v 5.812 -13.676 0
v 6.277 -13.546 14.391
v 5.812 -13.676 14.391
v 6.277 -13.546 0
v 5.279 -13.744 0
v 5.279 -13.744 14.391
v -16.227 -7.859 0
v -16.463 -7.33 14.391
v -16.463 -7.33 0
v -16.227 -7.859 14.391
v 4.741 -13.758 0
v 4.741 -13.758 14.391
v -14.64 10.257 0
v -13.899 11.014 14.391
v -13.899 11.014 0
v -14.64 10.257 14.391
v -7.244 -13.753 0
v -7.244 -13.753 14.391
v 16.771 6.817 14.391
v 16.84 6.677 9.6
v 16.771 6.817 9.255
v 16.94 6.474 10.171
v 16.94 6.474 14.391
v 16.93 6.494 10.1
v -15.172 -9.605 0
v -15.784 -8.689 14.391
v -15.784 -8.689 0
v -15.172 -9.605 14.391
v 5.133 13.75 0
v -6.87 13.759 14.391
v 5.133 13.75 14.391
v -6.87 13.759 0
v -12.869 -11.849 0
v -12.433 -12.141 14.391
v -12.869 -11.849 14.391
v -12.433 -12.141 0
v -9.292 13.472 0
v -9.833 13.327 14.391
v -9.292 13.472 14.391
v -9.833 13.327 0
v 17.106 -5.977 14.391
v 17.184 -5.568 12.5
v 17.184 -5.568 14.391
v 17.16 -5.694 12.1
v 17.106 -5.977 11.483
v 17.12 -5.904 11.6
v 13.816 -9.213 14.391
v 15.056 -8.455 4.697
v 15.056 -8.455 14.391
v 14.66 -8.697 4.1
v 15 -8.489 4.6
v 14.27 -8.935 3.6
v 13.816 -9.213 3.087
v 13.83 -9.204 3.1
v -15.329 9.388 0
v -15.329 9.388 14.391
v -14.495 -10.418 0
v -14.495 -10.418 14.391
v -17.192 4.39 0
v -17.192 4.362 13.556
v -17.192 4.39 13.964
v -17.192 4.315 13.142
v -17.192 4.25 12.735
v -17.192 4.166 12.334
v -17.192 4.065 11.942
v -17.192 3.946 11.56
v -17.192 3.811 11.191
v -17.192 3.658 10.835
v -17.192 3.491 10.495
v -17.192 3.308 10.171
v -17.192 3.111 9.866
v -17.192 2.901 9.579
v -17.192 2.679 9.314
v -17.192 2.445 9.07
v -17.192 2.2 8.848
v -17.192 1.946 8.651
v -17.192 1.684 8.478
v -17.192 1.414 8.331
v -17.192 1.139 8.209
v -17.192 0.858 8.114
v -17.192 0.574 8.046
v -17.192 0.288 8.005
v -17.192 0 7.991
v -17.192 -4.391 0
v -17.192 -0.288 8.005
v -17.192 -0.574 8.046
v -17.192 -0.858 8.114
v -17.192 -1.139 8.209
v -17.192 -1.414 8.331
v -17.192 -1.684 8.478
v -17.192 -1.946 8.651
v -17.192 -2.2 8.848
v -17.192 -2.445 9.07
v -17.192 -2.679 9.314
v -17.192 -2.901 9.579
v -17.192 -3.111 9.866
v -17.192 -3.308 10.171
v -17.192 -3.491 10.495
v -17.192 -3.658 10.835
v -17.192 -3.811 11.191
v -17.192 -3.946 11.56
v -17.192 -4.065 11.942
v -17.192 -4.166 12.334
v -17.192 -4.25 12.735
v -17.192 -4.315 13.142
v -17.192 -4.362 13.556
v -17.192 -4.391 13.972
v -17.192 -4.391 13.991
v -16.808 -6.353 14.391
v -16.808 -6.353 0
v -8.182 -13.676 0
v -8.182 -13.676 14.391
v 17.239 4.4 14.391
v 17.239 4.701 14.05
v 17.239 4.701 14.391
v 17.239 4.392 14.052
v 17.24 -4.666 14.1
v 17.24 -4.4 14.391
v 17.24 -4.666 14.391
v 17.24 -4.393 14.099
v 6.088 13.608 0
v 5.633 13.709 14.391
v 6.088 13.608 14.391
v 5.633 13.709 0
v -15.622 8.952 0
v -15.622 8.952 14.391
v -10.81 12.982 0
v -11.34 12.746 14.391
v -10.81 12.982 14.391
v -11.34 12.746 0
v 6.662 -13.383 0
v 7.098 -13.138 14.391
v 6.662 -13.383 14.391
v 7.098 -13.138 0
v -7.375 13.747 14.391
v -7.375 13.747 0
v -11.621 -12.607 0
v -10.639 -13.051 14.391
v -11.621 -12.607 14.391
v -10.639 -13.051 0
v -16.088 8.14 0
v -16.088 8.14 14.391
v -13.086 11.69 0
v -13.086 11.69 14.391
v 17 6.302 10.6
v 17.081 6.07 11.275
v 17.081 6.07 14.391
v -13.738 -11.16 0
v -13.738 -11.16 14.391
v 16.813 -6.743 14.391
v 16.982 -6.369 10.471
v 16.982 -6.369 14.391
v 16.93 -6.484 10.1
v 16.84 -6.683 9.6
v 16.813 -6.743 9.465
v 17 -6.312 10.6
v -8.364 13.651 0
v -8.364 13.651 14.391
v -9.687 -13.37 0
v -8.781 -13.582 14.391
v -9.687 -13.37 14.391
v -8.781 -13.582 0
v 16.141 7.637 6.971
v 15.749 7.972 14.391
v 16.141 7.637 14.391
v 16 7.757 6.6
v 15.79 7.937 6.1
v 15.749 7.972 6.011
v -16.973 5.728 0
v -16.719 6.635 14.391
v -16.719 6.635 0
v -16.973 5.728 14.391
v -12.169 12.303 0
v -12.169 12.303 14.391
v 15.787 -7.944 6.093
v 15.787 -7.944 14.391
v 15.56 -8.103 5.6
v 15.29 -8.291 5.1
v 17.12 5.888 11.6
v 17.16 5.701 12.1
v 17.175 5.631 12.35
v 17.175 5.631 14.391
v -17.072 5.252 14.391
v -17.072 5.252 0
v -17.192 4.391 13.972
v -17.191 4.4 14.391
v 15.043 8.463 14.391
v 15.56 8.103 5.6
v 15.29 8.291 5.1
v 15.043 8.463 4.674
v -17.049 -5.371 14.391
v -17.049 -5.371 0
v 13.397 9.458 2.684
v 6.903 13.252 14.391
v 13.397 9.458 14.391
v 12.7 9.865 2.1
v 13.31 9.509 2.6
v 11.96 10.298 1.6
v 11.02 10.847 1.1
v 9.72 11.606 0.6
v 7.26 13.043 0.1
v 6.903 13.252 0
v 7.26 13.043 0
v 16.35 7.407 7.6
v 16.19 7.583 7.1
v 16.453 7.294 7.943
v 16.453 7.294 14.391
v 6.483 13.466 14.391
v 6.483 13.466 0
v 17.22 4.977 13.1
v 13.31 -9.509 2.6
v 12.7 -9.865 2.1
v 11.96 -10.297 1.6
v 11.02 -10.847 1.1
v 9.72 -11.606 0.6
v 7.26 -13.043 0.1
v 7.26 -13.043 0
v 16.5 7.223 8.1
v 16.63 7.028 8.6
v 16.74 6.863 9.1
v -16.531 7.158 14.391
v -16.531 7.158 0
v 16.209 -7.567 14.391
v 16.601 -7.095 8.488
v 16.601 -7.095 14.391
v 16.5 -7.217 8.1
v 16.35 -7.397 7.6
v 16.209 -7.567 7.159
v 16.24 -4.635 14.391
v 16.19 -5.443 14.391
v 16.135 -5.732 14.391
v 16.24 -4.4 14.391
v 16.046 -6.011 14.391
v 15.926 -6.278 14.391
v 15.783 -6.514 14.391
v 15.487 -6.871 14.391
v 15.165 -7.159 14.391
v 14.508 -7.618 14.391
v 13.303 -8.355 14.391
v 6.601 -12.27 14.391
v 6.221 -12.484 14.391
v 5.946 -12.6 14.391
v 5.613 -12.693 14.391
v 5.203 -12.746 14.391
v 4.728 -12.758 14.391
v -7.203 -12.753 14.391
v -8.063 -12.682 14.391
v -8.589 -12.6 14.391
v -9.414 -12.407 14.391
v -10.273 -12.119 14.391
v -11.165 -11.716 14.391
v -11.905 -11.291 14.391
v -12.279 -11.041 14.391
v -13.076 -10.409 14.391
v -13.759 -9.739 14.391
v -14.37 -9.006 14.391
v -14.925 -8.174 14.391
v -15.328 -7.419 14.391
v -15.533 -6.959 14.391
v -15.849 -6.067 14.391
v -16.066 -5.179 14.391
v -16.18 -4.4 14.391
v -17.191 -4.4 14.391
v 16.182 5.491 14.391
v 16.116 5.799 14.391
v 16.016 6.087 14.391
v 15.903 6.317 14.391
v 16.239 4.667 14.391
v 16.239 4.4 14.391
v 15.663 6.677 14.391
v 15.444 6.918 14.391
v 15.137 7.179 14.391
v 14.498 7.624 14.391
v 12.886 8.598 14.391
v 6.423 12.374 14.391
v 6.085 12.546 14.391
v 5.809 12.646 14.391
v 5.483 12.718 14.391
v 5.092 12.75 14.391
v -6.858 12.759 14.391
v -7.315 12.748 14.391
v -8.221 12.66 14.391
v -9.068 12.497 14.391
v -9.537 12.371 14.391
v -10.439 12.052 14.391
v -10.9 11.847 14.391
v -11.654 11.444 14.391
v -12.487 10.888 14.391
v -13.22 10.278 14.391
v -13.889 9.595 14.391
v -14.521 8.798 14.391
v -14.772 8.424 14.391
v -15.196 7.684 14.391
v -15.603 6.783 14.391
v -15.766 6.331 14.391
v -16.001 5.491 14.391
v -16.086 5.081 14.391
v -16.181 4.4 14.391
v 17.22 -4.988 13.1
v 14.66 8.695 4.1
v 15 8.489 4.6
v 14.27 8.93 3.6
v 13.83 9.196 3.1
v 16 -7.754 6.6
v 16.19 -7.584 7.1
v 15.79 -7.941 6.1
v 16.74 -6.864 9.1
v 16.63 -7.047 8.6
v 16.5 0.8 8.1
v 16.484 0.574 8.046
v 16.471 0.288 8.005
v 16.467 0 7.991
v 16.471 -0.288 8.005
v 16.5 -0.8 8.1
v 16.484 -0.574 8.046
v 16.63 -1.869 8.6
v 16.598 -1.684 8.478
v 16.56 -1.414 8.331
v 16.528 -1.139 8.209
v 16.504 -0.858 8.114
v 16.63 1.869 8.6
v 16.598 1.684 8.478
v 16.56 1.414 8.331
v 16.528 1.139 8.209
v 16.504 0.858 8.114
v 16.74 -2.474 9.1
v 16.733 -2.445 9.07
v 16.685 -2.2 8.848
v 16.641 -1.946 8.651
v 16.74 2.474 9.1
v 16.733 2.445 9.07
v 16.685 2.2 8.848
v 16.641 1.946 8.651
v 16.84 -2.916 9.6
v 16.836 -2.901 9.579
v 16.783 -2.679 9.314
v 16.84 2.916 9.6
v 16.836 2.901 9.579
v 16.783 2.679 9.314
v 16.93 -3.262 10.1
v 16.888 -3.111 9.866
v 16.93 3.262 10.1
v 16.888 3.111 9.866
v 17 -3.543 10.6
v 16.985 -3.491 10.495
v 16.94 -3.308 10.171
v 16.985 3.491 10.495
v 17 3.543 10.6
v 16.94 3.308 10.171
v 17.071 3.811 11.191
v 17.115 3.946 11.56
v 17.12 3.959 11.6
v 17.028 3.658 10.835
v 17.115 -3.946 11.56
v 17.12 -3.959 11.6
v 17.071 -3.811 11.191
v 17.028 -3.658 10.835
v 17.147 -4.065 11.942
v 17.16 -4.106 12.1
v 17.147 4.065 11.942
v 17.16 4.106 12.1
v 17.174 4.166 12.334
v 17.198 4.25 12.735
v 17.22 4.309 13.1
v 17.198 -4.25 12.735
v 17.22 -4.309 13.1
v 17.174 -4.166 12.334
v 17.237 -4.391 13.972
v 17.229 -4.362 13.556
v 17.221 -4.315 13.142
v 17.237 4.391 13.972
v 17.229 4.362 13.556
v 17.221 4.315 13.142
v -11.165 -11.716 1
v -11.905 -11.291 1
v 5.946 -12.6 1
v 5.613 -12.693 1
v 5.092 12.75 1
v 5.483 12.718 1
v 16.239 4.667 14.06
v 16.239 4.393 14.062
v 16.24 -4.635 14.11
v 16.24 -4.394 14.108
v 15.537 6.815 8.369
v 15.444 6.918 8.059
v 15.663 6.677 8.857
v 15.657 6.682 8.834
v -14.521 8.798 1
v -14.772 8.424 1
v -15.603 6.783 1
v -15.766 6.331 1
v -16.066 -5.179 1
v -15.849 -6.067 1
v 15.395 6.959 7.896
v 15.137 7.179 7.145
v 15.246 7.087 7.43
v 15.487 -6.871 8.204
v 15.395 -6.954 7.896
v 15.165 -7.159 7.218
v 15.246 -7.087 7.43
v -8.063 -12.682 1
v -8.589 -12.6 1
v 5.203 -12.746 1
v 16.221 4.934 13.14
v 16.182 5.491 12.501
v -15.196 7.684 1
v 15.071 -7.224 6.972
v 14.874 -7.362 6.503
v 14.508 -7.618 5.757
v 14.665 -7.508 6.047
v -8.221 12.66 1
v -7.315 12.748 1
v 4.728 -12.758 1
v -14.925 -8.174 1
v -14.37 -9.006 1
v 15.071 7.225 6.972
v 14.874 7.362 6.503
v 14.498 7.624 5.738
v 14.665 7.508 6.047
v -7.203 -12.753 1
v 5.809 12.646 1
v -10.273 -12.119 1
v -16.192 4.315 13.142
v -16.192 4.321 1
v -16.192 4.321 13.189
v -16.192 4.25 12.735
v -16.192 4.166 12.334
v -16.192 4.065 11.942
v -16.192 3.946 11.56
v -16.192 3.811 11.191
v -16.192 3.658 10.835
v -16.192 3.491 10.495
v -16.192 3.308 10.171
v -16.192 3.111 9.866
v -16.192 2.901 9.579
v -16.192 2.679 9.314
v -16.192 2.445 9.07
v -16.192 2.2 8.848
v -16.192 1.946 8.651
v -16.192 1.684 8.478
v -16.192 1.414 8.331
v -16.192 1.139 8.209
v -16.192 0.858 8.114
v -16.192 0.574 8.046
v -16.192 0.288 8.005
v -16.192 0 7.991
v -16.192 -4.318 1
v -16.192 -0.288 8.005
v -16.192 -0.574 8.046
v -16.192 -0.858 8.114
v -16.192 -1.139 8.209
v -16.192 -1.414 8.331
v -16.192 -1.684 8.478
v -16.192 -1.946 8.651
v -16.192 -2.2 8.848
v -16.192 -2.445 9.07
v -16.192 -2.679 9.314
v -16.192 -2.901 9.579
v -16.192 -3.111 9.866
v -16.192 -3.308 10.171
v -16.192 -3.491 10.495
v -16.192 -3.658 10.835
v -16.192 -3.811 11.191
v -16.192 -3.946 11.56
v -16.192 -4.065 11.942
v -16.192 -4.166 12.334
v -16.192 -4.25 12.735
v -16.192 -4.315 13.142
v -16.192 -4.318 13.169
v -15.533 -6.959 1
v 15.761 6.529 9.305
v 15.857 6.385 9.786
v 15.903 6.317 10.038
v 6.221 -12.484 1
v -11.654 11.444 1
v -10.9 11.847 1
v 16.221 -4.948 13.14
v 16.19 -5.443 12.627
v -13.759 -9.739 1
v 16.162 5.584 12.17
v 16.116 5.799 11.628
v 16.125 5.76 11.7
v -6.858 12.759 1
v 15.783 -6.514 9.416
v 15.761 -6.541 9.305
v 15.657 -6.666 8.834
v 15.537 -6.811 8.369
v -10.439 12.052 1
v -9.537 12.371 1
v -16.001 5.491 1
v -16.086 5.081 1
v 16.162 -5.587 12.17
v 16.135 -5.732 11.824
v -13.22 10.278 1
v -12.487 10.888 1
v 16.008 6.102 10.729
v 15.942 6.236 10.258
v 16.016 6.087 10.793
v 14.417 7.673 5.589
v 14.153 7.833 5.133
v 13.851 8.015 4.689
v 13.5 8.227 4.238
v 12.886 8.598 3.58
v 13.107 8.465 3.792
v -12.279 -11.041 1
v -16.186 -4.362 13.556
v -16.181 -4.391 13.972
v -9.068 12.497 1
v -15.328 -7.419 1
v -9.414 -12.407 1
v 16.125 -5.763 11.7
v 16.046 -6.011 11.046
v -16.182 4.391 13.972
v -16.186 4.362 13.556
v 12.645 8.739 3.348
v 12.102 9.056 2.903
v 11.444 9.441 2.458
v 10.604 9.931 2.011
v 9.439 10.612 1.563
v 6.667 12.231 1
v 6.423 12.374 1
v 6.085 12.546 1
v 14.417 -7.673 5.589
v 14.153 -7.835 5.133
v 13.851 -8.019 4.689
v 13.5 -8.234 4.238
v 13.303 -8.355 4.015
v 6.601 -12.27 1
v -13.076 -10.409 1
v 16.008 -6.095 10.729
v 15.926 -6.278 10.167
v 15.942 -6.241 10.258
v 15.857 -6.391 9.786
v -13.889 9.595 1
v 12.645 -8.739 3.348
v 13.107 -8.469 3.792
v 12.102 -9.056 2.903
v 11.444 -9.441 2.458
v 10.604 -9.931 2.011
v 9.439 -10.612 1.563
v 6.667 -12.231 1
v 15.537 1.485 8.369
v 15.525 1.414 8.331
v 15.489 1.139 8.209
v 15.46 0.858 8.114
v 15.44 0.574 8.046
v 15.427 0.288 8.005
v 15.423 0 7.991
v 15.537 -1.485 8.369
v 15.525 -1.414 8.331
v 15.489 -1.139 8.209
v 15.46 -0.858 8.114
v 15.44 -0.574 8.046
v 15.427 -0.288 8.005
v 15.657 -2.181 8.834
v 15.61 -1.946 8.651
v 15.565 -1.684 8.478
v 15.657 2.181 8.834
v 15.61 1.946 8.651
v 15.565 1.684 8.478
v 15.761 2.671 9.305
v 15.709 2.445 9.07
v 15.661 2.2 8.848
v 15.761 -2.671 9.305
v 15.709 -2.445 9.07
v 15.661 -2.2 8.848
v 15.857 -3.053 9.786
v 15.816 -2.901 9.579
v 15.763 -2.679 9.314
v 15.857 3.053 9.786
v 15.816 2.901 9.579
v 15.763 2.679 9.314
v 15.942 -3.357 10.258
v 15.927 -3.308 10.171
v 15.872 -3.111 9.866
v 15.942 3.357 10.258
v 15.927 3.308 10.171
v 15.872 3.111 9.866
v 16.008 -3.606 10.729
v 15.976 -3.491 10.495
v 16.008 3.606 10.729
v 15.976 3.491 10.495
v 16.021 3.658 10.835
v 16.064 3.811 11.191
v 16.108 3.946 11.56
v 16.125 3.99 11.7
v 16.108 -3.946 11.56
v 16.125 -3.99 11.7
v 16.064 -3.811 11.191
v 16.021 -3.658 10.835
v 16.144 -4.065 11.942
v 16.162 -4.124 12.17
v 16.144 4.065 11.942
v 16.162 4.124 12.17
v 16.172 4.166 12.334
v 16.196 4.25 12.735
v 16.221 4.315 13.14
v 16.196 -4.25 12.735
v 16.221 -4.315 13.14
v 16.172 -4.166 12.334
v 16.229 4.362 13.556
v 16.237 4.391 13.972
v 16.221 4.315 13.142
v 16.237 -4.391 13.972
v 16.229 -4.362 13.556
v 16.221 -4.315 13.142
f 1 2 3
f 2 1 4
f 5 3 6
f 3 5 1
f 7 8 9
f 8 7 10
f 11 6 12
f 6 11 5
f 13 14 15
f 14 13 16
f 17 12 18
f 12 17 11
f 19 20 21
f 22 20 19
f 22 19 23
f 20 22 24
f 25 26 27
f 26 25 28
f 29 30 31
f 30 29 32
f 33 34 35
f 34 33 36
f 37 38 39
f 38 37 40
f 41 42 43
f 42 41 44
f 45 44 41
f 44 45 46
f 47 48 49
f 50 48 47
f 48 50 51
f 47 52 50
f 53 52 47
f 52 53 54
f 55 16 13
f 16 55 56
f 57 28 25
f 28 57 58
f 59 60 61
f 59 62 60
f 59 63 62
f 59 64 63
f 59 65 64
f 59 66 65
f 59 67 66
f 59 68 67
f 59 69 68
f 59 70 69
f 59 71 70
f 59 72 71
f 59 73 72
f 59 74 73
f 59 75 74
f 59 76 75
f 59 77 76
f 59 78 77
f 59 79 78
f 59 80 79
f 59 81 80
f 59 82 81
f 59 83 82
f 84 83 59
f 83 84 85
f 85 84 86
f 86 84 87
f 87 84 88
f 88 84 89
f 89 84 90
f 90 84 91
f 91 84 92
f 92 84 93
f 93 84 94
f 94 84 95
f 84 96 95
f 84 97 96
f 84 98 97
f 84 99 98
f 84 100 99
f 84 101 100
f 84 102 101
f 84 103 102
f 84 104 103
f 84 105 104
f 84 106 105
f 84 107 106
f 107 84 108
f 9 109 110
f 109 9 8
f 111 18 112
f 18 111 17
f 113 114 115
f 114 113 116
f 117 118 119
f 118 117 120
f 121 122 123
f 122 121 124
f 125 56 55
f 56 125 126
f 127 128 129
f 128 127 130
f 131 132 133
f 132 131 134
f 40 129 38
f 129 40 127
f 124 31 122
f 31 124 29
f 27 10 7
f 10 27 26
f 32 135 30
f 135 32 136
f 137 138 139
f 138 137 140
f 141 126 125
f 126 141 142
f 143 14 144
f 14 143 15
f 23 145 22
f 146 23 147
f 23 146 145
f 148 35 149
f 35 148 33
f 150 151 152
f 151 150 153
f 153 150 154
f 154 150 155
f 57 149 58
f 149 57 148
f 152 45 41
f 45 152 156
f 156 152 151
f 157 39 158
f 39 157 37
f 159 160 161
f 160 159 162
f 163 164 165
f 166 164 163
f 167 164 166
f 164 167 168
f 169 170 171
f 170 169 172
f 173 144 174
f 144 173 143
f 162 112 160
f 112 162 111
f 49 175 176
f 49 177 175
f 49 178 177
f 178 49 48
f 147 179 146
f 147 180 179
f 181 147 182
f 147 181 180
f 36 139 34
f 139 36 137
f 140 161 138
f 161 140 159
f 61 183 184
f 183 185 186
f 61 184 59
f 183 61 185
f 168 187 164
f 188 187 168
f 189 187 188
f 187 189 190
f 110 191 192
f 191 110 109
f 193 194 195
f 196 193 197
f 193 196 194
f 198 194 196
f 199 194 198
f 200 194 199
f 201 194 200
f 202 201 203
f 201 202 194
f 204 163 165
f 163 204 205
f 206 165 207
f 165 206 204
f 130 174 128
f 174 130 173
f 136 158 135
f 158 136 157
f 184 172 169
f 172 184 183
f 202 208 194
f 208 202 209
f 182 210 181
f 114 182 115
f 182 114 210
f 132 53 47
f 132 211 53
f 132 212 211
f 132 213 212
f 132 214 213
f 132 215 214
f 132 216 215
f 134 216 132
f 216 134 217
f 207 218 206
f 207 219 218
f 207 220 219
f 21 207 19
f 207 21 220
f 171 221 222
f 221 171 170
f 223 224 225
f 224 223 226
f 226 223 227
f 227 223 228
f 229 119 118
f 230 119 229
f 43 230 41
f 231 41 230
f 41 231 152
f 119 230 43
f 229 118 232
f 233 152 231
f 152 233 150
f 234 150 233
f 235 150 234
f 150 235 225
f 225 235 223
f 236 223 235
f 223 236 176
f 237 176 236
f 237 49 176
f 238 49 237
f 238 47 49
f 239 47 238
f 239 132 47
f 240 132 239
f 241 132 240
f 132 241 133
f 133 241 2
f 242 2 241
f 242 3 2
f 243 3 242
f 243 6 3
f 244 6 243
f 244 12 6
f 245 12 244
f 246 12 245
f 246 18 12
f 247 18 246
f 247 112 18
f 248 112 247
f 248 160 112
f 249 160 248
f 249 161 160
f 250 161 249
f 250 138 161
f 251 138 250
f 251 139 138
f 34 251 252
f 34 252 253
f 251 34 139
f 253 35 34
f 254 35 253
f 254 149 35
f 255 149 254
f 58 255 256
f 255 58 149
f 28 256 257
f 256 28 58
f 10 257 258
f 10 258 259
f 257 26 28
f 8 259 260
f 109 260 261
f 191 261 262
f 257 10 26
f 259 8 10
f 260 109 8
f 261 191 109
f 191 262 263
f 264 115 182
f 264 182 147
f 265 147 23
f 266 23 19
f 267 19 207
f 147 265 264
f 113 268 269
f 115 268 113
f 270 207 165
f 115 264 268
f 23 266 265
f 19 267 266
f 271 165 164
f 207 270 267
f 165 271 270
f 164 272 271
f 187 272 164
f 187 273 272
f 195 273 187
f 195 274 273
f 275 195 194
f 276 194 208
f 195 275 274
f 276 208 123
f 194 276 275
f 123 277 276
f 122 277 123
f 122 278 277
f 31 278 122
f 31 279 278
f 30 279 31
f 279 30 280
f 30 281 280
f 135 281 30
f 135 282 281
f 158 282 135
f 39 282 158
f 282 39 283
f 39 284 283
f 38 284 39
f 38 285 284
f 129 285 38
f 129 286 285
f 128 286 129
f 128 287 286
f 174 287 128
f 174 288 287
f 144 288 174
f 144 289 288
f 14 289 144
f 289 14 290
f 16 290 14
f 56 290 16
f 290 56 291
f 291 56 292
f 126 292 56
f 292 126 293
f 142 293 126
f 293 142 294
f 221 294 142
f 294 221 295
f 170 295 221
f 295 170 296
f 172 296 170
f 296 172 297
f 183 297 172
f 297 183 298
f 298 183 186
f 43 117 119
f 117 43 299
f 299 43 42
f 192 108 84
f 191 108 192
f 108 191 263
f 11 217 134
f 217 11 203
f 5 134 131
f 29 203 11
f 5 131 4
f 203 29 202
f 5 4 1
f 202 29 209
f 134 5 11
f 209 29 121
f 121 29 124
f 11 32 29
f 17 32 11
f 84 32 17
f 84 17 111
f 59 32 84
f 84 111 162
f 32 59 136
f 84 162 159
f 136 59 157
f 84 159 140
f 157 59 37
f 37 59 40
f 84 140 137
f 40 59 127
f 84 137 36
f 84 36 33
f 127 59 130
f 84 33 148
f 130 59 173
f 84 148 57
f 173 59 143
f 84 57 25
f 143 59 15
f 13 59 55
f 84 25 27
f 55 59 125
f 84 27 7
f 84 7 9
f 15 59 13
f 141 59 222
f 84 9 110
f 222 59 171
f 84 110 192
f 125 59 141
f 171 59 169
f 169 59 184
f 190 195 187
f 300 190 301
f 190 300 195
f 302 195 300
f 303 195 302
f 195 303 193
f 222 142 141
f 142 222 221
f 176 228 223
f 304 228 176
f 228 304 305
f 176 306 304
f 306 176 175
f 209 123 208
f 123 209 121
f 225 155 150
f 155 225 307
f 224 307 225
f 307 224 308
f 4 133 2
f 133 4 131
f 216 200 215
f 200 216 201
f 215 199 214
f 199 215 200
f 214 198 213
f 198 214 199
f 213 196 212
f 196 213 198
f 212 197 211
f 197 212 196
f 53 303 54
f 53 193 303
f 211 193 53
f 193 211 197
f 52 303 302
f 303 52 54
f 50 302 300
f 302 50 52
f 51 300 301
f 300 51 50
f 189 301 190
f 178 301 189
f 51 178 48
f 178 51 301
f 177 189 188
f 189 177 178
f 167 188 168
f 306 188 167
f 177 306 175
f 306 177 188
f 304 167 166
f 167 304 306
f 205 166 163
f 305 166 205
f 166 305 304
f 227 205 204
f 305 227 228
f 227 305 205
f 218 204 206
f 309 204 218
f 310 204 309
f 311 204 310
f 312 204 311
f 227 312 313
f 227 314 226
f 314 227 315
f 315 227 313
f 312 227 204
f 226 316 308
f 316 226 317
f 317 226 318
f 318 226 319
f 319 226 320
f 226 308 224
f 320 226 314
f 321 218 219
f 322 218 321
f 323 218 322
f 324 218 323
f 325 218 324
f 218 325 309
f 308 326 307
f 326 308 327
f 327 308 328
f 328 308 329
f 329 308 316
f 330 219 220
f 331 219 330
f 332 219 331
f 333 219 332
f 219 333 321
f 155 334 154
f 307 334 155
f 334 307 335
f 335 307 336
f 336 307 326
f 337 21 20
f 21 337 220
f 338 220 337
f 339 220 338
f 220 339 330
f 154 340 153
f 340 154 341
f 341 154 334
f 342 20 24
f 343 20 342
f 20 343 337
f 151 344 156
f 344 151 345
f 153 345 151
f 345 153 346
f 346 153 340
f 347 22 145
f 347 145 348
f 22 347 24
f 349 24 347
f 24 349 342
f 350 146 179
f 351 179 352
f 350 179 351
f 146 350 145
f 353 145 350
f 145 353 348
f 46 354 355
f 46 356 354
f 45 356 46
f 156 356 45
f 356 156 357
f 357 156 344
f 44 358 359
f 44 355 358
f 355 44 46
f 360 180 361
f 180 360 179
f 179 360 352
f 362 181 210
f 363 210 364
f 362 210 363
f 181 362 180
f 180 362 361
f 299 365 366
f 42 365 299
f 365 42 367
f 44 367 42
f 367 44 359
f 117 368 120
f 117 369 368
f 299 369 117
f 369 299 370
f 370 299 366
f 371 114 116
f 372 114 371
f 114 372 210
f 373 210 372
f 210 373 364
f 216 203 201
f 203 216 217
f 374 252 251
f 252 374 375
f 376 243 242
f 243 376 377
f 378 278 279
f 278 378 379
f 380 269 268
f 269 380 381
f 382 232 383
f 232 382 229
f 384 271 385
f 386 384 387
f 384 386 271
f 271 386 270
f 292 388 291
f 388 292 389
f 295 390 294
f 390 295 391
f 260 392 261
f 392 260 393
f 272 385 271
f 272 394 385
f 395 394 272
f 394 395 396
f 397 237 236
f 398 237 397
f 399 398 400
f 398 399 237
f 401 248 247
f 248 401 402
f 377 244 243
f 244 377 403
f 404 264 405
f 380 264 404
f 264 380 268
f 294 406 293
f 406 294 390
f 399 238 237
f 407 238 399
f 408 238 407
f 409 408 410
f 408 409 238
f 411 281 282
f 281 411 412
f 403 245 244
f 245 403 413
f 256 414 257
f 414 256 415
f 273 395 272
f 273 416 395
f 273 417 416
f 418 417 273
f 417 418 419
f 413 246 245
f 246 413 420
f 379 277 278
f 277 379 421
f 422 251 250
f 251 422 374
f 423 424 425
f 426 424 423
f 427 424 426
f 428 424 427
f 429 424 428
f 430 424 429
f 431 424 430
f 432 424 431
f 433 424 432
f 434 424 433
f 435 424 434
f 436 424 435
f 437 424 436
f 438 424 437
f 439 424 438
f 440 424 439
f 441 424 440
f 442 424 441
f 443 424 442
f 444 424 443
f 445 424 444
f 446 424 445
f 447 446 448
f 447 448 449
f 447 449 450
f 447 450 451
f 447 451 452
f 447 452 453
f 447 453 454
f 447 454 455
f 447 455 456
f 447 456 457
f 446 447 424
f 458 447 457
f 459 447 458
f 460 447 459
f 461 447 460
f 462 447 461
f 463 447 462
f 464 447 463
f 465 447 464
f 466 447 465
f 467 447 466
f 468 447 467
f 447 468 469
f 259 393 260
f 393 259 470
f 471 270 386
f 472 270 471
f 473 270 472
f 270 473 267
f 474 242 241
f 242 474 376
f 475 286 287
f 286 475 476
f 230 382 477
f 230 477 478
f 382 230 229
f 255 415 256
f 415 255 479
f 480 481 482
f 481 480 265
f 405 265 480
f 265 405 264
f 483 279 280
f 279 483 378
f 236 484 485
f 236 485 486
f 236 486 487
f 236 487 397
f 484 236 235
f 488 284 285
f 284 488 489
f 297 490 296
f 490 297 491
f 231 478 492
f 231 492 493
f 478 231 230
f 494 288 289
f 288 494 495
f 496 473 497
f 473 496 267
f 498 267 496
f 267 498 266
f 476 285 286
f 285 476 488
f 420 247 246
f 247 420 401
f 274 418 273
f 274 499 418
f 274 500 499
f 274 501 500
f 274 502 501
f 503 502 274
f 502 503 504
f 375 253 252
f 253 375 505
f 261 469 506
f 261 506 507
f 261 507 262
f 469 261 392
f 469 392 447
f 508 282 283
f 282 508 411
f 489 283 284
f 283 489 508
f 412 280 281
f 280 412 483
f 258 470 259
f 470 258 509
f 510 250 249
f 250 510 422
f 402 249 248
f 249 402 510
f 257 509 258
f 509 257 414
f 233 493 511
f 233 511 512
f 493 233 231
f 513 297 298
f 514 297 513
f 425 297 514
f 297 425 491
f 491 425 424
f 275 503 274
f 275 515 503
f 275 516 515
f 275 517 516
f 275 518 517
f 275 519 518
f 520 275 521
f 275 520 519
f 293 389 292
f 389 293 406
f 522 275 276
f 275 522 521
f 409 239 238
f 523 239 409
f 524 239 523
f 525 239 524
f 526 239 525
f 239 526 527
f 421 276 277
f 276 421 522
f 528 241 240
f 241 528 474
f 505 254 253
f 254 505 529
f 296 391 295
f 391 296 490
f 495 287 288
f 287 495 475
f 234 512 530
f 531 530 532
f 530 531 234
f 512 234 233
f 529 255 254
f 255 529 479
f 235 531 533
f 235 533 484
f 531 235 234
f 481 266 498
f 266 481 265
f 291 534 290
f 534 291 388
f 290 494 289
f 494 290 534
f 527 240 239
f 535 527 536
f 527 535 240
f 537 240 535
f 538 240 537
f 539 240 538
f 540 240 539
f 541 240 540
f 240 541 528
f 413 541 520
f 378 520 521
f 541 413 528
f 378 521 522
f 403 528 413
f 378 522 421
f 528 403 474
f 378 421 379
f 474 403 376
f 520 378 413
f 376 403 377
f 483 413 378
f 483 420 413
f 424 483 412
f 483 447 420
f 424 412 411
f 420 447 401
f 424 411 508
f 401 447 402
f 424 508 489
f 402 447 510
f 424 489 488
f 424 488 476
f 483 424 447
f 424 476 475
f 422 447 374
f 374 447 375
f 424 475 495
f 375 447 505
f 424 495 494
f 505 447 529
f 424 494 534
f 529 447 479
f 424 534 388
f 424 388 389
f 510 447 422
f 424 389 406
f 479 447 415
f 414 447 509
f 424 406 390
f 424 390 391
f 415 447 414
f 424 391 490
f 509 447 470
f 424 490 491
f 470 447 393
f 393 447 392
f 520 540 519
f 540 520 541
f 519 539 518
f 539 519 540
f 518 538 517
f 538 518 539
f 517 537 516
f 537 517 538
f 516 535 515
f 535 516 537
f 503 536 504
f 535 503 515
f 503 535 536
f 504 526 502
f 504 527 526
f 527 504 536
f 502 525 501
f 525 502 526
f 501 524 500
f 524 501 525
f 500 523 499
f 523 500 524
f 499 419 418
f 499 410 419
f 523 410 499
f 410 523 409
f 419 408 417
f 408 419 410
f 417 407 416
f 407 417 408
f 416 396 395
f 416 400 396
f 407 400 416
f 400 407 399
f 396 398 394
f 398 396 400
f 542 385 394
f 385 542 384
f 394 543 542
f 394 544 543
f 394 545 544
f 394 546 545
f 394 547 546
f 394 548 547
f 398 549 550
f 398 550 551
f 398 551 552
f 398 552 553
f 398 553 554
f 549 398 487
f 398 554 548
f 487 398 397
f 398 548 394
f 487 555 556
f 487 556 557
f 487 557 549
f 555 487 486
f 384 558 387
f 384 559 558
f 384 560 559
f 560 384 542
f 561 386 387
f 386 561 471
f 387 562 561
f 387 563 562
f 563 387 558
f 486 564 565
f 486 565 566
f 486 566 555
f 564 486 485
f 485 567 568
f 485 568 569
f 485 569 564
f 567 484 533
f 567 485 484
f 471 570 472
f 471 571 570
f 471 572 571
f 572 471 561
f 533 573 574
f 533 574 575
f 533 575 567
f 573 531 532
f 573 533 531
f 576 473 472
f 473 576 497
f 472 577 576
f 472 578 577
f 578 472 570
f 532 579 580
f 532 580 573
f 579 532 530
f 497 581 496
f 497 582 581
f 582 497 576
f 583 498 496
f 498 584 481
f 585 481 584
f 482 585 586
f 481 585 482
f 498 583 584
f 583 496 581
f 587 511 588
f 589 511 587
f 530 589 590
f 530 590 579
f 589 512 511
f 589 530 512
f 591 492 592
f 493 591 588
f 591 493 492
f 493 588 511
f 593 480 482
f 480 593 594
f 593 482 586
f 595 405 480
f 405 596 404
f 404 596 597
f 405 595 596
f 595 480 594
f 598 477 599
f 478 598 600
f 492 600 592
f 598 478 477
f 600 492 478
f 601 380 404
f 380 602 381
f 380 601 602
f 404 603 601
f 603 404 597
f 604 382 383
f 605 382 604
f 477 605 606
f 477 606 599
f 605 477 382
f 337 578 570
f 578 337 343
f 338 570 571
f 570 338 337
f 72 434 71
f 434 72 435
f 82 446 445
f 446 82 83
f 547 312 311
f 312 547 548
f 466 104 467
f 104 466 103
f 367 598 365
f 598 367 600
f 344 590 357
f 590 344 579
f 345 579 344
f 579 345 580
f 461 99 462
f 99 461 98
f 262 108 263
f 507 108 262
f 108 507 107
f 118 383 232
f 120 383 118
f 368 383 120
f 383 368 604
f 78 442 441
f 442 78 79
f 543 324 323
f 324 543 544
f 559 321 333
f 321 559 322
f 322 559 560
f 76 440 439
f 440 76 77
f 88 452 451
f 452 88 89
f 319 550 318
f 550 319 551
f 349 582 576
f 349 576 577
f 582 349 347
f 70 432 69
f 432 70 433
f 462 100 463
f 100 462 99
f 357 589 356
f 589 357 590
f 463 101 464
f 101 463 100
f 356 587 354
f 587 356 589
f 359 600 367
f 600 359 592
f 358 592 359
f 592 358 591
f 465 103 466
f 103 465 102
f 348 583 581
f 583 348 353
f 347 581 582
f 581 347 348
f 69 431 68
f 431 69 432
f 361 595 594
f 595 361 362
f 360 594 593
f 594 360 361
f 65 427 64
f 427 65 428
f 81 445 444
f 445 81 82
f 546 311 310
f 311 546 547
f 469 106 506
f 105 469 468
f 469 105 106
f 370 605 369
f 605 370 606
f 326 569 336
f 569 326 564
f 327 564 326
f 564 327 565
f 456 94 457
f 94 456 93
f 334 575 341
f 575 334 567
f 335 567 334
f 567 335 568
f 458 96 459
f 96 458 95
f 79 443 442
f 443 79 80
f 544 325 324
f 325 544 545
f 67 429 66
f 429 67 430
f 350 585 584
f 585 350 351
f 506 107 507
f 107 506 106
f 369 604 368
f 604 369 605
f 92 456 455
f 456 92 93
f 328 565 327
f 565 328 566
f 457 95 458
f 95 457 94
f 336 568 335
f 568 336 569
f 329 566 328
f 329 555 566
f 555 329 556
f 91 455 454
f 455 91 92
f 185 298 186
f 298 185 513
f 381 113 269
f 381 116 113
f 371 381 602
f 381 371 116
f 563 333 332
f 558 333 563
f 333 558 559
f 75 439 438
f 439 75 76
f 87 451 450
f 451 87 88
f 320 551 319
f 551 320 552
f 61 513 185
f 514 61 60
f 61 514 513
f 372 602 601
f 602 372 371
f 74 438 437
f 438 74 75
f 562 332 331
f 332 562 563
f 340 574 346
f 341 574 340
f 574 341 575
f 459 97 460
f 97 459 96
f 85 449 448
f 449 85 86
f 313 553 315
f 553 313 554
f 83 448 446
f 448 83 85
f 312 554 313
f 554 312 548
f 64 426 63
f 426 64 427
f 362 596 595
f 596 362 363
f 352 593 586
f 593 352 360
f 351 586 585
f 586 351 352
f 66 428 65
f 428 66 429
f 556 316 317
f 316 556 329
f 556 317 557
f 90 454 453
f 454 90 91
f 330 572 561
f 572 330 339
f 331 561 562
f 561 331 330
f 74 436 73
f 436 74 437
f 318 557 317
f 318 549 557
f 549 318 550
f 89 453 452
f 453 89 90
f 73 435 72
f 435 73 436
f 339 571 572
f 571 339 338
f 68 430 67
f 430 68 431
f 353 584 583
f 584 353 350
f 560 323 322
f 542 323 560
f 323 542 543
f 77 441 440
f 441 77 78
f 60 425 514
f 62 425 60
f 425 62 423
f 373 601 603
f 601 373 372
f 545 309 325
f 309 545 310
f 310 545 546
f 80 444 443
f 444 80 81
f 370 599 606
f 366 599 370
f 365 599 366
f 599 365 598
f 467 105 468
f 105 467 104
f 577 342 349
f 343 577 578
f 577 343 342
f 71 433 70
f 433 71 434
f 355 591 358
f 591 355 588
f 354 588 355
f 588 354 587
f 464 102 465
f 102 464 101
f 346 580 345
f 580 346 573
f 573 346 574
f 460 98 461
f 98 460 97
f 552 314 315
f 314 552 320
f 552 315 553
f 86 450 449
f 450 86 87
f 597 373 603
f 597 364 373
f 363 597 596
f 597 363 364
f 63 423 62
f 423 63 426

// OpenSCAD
// 11 - Honeycomb - topminibox - box: static OpenSCAD reconstruction (shallow box with a scooped end and a notch).
//
// Adapted from "Onz" by sez16sez (Thingiverse): https://www.thingiverse.com/thing:2739061
// Licensed CC BY-NC 4.0 (https://creativecommons.org/licenses/by-nc/4.0/). This file is a derivative reconstruction of
// the design's STL (11_-_Honeycomb_-_topminibox_-_box.stl) made for CanFactory: same attribution, same non-commercial
// terms, no additional rights to the original. See ../ATTRIBUTION.md.
//
// Geometry: a 1 mm shell over a D-shaped plan (rounded -X end, chamfered +X end) with a 1 mm floor. The +X end is swept
// away by a curved profile (the outer surface climbs from x = 6 at the floor to x = 17.2 at the rim) and an elliptical
// notch is cut through the rim at both ends. Units are millimetres; the part is centred on the Z axis with its floor on z = 0.
// The source STL sat at (239.3, -84.8) on the print plate. Static reconstruction: named dimensions only; no snap
// parameter (its notches already are the detent the lid latches into).

SCALE     = 1;
ROUNDNESS = 96;

HEIGHT = 14.391;      // rim height
WALL   = 1;           // wall and floor thickness

// Plan outline (x, y) about the part centre.
PLAN = [[16.982, -6.369], [17.106, -5.977], [17.184, -5.568], [17.24, -4.666], [17.239, 4.701], [17.175, 5.631], [17.081,
        6.07], [16.94, 6.474], [16.771, 6.817], [16.453, 7.294], [16.141, 7.637], [15.749, 7.972], [15.043, 8.463],
        [13.397, 9.458], [6.903, 13.252], [6.483, 13.466], [6.088, 13.608], [5.633, 13.709], [5.133, 13.75], [-6.87,
        13.759], [-7.375, 13.747], [-8.364, 13.651], [-9.292, 13.472], [-9.833, 13.327], [-10.81, 12.982], [-11.34,
        12.746], [-12.169, 12.303], [-13.086, 11.69], [-13.899, 11.014], [-14.64, 10.257], [-15.329, 9.388], [-15.622,
        8.952], [-16.088, 8.14], [-16.531, 7.158], [-16.719, 6.635], [-16.973, 5.728], [-17.072, 5.252], [-17.192,
        4.39], [-17.192, -4.391], [-17.049, -5.371], [-16.808, -6.353], [-16.463, -7.33], [-16.227, -7.859], [-15.784,
        -8.689], [-15.172, -9.605], [-14.495, -10.418], [-13.738, -11.16], [-12.869, -11.849], [-12.433, -12.141],
        [-11.621, -12.607], [-10.639, -13.051], [-9.687, -13.37], [-8.781, -13.582], [-8.182, -13.676], [-7.244,
        -13.753], [4.741, -13.758], [5.279, -13.744], [5.812, -13.676], [6.277, -13.546], [6.662, -13.383], [7.098,
        -13.138], [13.816, -9.213], [15.056, -8.455], [15.787, -7.944], [16.209, -7.567], [16.601, -7.095], [16.813,
        -6.743]];

// Outer surface of the swept +X end: [x, z] pairs; everything to the +X side of this curve is removed.
END_CURVE = [[7.26, 0.1], [9.72, 0.6], [11.02, 1.1], [11.96, 1.6], [12.7, 2.1], [13.31, 2.6], [13.83, 3.1], [14.27, 3.6], [14.66,
        4.1], [15, 4.6], [15.29, 5.1], [15.56, 5.6], [15.79, 6.1], [16, 6.6], [16.19, 7.1], [16.35, 7.6], [16.5, 8.1],
        [16.63, 8.6], [16.74, 9.1], [16.84, 9.6], [16.93, 10.1], [17, 10.6], [17.06, 11.1], [17.12, 11.6], [17.16,
        12.1], [17.19, 12.6], [17.22, 13.1], [17.23, 13.6], [17.24, 14.1]];
END_TOP_X = 20;       // any x beyond the rim, closes the cutter polygon

// Notch through both end walls: an elliptical cylinder along X (half-width along Y, half-height along Z, centre height).
NOTCH_A  = 4.4;
NOTCH_C  = 6.4;
NOTCH_Z0 = 14.391;
NOTCH_LEN = 60;       // longer than the part

// Region kept below the swept end, in the (x, z) plane: from far -X across the floor and up the curve. HEADROOM makes the
// region taller than the part so that insetting it does not create a lid.
HEADROOM = 10;
module keep_region() {
  polygon(concat([[-30, -HEADROOM], [END_CURVE[0][0], -HEADROOM]], END_CURVE, [[END_TOP_X, HEIGHT + HEADROOM], [-30, HEIGHT + HEADROOM]]));
}

module across_y(len) rotate([90, 0, 0]) linear_extrude(height = len, center = true) children();

module topminibox_box() {
  difference() {
    intersection() {
      linear_extrude(height = HEIGHT) polygon(PLAN);
      across_y(40) keep_region();
    }
    intersection() {
      translate([0, 0, WALL]) linear_extrude(height = HEIGHT) offset(delta = -WALL) polygon(PLAN);
      across_y(40) offset(delta = -WALL) keep_region();
    }
    translate([0, 0, NOTCH_Z0]) rotate([0, 90, 0]) scale([NOTCH_C, NOTCH_A, 1]) cylinder(r = 1, h = NOTCH_LEN, center = true, $fn = ROUNDNESS);
  }
}

scale(SCALE) topminibox_box();
